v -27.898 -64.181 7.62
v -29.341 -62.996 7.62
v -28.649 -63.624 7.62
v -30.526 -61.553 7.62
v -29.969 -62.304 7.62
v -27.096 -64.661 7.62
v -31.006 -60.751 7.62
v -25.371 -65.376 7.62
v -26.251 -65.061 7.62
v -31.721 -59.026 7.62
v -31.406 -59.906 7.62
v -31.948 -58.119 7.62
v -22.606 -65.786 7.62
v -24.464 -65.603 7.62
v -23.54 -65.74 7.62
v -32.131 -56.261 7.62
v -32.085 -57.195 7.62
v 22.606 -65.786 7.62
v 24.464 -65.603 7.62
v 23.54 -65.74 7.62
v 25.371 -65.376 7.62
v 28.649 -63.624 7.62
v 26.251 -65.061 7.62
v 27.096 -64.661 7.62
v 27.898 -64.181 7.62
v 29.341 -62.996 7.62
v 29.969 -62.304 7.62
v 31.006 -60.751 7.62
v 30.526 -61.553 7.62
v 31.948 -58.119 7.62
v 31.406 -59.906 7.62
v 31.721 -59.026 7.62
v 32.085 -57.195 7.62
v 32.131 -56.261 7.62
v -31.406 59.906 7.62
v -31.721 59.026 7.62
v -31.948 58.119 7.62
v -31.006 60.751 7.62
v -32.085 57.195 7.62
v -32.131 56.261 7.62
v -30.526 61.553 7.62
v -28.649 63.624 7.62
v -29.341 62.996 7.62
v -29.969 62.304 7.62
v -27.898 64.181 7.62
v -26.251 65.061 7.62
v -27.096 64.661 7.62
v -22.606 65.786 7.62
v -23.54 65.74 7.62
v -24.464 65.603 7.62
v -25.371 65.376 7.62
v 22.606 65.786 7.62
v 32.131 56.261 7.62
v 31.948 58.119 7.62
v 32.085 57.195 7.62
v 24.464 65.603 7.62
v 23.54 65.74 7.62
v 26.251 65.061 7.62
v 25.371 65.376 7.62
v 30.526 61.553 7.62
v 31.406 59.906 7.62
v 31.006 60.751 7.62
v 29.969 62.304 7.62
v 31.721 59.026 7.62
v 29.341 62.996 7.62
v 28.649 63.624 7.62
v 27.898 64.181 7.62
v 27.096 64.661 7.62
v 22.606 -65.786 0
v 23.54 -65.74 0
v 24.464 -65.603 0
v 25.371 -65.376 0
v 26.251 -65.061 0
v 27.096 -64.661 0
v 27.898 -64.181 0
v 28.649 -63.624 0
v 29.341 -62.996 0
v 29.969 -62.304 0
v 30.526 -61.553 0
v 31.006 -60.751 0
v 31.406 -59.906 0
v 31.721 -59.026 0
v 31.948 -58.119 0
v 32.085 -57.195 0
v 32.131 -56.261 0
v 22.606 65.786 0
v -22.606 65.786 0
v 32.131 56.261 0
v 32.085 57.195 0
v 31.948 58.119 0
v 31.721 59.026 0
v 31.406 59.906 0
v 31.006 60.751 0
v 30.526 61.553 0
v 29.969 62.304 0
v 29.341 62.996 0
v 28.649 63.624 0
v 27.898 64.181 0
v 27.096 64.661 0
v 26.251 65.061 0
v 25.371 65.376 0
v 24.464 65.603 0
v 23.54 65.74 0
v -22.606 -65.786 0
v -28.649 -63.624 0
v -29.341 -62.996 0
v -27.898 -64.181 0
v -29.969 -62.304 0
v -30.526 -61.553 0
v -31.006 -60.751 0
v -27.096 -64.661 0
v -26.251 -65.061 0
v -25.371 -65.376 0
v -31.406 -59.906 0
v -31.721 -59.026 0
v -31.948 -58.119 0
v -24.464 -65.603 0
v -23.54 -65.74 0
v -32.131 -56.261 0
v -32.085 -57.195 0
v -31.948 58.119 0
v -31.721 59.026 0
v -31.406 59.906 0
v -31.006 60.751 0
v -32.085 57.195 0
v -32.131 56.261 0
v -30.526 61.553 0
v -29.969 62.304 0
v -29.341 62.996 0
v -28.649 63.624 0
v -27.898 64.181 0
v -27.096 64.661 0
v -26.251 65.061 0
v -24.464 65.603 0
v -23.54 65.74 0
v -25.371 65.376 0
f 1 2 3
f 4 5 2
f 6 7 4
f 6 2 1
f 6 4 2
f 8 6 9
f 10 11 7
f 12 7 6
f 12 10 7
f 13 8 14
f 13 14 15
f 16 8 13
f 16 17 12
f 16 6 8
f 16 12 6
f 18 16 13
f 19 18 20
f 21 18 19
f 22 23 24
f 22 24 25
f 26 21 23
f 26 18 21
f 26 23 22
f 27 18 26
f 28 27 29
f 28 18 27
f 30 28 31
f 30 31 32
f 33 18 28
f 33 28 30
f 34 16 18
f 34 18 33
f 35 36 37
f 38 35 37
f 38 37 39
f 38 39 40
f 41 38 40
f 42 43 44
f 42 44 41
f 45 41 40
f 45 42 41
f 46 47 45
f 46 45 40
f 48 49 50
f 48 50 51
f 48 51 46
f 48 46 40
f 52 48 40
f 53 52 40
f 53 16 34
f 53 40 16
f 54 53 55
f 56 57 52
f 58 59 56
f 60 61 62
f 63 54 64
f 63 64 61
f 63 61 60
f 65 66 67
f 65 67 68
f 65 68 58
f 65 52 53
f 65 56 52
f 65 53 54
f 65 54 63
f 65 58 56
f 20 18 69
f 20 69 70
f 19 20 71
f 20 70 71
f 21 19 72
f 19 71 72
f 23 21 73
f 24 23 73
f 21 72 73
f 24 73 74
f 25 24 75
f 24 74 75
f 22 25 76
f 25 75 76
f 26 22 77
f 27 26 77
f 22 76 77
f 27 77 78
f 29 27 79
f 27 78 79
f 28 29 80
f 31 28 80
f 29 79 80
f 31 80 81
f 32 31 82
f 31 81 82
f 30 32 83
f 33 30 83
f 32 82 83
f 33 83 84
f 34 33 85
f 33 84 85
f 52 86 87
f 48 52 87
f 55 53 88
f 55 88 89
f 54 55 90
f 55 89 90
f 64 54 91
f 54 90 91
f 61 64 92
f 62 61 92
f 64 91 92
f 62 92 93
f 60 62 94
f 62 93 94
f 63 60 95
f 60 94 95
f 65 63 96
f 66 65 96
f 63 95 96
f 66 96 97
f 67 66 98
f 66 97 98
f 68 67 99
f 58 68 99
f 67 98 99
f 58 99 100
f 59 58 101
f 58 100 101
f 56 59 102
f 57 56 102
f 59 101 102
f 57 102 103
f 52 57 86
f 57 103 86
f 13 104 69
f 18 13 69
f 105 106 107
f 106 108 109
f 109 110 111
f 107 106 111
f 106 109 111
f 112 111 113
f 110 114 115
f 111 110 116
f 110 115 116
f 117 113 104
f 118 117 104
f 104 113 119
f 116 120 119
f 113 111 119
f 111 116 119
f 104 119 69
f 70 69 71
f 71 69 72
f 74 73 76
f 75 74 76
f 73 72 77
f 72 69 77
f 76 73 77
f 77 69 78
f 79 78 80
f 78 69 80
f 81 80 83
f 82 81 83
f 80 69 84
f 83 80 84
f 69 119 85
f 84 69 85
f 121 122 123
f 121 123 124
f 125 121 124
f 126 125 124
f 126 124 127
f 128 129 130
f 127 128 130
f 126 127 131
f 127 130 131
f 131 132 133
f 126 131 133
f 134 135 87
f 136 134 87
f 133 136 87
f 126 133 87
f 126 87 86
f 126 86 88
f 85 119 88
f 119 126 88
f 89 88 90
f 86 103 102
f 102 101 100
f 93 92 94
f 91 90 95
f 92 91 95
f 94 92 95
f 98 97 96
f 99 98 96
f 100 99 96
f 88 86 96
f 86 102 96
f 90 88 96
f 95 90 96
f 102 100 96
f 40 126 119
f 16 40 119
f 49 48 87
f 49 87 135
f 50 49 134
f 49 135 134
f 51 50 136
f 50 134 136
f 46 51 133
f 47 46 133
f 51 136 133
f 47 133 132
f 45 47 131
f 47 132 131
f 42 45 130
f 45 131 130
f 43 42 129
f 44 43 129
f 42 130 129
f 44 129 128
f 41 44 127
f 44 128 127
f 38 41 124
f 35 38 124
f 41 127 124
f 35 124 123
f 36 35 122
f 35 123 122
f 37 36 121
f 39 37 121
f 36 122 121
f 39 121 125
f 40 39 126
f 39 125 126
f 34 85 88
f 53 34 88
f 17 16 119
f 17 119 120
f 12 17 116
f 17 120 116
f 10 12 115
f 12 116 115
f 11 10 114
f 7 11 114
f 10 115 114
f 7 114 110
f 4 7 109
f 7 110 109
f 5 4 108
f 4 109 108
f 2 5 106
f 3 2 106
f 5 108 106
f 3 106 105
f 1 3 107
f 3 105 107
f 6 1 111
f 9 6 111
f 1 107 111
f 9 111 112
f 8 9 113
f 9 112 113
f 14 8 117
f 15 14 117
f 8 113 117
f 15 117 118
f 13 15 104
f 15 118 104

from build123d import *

# Parameters (mm, degrees)
BOSS_EXTRUDE1_DEPTH = 7.62


with BuildPart() as part:
    # Sketch1 → Boss-Extrude1 (new body)
    with BuildSketch(Plane.XY):
        with BuildLine():
            Line((-22.606, -65.786), (22.606, -65.786))
            ThreePointArc((22.606, -65.786), (29.341192091, -62.996192091), (32.131, -56.261))
            Line((32.131, -56.261), (32.131, 56.261))
            ThreePointArc((32.131, 56.261), (29.341192091, 62.996192091), (22.606, 65.786))
            Line((22.606, 65.786), (-22.606, 65.786))
            ThreePointArc((-22.606, 65.786), (-29.341192091, 62.996192091), (-32.131, 56.261))
            Line((-32.131, 56.261), (-32.131, -56.261))
            ThreePointArc((-32.131, -56.261), (-29.341192091, -62.996192091), (-22.606, -65.786))
        make_face()
    extrude(amount=BOSS_EXTRUDE1_DEPTH)


solid = part.part
